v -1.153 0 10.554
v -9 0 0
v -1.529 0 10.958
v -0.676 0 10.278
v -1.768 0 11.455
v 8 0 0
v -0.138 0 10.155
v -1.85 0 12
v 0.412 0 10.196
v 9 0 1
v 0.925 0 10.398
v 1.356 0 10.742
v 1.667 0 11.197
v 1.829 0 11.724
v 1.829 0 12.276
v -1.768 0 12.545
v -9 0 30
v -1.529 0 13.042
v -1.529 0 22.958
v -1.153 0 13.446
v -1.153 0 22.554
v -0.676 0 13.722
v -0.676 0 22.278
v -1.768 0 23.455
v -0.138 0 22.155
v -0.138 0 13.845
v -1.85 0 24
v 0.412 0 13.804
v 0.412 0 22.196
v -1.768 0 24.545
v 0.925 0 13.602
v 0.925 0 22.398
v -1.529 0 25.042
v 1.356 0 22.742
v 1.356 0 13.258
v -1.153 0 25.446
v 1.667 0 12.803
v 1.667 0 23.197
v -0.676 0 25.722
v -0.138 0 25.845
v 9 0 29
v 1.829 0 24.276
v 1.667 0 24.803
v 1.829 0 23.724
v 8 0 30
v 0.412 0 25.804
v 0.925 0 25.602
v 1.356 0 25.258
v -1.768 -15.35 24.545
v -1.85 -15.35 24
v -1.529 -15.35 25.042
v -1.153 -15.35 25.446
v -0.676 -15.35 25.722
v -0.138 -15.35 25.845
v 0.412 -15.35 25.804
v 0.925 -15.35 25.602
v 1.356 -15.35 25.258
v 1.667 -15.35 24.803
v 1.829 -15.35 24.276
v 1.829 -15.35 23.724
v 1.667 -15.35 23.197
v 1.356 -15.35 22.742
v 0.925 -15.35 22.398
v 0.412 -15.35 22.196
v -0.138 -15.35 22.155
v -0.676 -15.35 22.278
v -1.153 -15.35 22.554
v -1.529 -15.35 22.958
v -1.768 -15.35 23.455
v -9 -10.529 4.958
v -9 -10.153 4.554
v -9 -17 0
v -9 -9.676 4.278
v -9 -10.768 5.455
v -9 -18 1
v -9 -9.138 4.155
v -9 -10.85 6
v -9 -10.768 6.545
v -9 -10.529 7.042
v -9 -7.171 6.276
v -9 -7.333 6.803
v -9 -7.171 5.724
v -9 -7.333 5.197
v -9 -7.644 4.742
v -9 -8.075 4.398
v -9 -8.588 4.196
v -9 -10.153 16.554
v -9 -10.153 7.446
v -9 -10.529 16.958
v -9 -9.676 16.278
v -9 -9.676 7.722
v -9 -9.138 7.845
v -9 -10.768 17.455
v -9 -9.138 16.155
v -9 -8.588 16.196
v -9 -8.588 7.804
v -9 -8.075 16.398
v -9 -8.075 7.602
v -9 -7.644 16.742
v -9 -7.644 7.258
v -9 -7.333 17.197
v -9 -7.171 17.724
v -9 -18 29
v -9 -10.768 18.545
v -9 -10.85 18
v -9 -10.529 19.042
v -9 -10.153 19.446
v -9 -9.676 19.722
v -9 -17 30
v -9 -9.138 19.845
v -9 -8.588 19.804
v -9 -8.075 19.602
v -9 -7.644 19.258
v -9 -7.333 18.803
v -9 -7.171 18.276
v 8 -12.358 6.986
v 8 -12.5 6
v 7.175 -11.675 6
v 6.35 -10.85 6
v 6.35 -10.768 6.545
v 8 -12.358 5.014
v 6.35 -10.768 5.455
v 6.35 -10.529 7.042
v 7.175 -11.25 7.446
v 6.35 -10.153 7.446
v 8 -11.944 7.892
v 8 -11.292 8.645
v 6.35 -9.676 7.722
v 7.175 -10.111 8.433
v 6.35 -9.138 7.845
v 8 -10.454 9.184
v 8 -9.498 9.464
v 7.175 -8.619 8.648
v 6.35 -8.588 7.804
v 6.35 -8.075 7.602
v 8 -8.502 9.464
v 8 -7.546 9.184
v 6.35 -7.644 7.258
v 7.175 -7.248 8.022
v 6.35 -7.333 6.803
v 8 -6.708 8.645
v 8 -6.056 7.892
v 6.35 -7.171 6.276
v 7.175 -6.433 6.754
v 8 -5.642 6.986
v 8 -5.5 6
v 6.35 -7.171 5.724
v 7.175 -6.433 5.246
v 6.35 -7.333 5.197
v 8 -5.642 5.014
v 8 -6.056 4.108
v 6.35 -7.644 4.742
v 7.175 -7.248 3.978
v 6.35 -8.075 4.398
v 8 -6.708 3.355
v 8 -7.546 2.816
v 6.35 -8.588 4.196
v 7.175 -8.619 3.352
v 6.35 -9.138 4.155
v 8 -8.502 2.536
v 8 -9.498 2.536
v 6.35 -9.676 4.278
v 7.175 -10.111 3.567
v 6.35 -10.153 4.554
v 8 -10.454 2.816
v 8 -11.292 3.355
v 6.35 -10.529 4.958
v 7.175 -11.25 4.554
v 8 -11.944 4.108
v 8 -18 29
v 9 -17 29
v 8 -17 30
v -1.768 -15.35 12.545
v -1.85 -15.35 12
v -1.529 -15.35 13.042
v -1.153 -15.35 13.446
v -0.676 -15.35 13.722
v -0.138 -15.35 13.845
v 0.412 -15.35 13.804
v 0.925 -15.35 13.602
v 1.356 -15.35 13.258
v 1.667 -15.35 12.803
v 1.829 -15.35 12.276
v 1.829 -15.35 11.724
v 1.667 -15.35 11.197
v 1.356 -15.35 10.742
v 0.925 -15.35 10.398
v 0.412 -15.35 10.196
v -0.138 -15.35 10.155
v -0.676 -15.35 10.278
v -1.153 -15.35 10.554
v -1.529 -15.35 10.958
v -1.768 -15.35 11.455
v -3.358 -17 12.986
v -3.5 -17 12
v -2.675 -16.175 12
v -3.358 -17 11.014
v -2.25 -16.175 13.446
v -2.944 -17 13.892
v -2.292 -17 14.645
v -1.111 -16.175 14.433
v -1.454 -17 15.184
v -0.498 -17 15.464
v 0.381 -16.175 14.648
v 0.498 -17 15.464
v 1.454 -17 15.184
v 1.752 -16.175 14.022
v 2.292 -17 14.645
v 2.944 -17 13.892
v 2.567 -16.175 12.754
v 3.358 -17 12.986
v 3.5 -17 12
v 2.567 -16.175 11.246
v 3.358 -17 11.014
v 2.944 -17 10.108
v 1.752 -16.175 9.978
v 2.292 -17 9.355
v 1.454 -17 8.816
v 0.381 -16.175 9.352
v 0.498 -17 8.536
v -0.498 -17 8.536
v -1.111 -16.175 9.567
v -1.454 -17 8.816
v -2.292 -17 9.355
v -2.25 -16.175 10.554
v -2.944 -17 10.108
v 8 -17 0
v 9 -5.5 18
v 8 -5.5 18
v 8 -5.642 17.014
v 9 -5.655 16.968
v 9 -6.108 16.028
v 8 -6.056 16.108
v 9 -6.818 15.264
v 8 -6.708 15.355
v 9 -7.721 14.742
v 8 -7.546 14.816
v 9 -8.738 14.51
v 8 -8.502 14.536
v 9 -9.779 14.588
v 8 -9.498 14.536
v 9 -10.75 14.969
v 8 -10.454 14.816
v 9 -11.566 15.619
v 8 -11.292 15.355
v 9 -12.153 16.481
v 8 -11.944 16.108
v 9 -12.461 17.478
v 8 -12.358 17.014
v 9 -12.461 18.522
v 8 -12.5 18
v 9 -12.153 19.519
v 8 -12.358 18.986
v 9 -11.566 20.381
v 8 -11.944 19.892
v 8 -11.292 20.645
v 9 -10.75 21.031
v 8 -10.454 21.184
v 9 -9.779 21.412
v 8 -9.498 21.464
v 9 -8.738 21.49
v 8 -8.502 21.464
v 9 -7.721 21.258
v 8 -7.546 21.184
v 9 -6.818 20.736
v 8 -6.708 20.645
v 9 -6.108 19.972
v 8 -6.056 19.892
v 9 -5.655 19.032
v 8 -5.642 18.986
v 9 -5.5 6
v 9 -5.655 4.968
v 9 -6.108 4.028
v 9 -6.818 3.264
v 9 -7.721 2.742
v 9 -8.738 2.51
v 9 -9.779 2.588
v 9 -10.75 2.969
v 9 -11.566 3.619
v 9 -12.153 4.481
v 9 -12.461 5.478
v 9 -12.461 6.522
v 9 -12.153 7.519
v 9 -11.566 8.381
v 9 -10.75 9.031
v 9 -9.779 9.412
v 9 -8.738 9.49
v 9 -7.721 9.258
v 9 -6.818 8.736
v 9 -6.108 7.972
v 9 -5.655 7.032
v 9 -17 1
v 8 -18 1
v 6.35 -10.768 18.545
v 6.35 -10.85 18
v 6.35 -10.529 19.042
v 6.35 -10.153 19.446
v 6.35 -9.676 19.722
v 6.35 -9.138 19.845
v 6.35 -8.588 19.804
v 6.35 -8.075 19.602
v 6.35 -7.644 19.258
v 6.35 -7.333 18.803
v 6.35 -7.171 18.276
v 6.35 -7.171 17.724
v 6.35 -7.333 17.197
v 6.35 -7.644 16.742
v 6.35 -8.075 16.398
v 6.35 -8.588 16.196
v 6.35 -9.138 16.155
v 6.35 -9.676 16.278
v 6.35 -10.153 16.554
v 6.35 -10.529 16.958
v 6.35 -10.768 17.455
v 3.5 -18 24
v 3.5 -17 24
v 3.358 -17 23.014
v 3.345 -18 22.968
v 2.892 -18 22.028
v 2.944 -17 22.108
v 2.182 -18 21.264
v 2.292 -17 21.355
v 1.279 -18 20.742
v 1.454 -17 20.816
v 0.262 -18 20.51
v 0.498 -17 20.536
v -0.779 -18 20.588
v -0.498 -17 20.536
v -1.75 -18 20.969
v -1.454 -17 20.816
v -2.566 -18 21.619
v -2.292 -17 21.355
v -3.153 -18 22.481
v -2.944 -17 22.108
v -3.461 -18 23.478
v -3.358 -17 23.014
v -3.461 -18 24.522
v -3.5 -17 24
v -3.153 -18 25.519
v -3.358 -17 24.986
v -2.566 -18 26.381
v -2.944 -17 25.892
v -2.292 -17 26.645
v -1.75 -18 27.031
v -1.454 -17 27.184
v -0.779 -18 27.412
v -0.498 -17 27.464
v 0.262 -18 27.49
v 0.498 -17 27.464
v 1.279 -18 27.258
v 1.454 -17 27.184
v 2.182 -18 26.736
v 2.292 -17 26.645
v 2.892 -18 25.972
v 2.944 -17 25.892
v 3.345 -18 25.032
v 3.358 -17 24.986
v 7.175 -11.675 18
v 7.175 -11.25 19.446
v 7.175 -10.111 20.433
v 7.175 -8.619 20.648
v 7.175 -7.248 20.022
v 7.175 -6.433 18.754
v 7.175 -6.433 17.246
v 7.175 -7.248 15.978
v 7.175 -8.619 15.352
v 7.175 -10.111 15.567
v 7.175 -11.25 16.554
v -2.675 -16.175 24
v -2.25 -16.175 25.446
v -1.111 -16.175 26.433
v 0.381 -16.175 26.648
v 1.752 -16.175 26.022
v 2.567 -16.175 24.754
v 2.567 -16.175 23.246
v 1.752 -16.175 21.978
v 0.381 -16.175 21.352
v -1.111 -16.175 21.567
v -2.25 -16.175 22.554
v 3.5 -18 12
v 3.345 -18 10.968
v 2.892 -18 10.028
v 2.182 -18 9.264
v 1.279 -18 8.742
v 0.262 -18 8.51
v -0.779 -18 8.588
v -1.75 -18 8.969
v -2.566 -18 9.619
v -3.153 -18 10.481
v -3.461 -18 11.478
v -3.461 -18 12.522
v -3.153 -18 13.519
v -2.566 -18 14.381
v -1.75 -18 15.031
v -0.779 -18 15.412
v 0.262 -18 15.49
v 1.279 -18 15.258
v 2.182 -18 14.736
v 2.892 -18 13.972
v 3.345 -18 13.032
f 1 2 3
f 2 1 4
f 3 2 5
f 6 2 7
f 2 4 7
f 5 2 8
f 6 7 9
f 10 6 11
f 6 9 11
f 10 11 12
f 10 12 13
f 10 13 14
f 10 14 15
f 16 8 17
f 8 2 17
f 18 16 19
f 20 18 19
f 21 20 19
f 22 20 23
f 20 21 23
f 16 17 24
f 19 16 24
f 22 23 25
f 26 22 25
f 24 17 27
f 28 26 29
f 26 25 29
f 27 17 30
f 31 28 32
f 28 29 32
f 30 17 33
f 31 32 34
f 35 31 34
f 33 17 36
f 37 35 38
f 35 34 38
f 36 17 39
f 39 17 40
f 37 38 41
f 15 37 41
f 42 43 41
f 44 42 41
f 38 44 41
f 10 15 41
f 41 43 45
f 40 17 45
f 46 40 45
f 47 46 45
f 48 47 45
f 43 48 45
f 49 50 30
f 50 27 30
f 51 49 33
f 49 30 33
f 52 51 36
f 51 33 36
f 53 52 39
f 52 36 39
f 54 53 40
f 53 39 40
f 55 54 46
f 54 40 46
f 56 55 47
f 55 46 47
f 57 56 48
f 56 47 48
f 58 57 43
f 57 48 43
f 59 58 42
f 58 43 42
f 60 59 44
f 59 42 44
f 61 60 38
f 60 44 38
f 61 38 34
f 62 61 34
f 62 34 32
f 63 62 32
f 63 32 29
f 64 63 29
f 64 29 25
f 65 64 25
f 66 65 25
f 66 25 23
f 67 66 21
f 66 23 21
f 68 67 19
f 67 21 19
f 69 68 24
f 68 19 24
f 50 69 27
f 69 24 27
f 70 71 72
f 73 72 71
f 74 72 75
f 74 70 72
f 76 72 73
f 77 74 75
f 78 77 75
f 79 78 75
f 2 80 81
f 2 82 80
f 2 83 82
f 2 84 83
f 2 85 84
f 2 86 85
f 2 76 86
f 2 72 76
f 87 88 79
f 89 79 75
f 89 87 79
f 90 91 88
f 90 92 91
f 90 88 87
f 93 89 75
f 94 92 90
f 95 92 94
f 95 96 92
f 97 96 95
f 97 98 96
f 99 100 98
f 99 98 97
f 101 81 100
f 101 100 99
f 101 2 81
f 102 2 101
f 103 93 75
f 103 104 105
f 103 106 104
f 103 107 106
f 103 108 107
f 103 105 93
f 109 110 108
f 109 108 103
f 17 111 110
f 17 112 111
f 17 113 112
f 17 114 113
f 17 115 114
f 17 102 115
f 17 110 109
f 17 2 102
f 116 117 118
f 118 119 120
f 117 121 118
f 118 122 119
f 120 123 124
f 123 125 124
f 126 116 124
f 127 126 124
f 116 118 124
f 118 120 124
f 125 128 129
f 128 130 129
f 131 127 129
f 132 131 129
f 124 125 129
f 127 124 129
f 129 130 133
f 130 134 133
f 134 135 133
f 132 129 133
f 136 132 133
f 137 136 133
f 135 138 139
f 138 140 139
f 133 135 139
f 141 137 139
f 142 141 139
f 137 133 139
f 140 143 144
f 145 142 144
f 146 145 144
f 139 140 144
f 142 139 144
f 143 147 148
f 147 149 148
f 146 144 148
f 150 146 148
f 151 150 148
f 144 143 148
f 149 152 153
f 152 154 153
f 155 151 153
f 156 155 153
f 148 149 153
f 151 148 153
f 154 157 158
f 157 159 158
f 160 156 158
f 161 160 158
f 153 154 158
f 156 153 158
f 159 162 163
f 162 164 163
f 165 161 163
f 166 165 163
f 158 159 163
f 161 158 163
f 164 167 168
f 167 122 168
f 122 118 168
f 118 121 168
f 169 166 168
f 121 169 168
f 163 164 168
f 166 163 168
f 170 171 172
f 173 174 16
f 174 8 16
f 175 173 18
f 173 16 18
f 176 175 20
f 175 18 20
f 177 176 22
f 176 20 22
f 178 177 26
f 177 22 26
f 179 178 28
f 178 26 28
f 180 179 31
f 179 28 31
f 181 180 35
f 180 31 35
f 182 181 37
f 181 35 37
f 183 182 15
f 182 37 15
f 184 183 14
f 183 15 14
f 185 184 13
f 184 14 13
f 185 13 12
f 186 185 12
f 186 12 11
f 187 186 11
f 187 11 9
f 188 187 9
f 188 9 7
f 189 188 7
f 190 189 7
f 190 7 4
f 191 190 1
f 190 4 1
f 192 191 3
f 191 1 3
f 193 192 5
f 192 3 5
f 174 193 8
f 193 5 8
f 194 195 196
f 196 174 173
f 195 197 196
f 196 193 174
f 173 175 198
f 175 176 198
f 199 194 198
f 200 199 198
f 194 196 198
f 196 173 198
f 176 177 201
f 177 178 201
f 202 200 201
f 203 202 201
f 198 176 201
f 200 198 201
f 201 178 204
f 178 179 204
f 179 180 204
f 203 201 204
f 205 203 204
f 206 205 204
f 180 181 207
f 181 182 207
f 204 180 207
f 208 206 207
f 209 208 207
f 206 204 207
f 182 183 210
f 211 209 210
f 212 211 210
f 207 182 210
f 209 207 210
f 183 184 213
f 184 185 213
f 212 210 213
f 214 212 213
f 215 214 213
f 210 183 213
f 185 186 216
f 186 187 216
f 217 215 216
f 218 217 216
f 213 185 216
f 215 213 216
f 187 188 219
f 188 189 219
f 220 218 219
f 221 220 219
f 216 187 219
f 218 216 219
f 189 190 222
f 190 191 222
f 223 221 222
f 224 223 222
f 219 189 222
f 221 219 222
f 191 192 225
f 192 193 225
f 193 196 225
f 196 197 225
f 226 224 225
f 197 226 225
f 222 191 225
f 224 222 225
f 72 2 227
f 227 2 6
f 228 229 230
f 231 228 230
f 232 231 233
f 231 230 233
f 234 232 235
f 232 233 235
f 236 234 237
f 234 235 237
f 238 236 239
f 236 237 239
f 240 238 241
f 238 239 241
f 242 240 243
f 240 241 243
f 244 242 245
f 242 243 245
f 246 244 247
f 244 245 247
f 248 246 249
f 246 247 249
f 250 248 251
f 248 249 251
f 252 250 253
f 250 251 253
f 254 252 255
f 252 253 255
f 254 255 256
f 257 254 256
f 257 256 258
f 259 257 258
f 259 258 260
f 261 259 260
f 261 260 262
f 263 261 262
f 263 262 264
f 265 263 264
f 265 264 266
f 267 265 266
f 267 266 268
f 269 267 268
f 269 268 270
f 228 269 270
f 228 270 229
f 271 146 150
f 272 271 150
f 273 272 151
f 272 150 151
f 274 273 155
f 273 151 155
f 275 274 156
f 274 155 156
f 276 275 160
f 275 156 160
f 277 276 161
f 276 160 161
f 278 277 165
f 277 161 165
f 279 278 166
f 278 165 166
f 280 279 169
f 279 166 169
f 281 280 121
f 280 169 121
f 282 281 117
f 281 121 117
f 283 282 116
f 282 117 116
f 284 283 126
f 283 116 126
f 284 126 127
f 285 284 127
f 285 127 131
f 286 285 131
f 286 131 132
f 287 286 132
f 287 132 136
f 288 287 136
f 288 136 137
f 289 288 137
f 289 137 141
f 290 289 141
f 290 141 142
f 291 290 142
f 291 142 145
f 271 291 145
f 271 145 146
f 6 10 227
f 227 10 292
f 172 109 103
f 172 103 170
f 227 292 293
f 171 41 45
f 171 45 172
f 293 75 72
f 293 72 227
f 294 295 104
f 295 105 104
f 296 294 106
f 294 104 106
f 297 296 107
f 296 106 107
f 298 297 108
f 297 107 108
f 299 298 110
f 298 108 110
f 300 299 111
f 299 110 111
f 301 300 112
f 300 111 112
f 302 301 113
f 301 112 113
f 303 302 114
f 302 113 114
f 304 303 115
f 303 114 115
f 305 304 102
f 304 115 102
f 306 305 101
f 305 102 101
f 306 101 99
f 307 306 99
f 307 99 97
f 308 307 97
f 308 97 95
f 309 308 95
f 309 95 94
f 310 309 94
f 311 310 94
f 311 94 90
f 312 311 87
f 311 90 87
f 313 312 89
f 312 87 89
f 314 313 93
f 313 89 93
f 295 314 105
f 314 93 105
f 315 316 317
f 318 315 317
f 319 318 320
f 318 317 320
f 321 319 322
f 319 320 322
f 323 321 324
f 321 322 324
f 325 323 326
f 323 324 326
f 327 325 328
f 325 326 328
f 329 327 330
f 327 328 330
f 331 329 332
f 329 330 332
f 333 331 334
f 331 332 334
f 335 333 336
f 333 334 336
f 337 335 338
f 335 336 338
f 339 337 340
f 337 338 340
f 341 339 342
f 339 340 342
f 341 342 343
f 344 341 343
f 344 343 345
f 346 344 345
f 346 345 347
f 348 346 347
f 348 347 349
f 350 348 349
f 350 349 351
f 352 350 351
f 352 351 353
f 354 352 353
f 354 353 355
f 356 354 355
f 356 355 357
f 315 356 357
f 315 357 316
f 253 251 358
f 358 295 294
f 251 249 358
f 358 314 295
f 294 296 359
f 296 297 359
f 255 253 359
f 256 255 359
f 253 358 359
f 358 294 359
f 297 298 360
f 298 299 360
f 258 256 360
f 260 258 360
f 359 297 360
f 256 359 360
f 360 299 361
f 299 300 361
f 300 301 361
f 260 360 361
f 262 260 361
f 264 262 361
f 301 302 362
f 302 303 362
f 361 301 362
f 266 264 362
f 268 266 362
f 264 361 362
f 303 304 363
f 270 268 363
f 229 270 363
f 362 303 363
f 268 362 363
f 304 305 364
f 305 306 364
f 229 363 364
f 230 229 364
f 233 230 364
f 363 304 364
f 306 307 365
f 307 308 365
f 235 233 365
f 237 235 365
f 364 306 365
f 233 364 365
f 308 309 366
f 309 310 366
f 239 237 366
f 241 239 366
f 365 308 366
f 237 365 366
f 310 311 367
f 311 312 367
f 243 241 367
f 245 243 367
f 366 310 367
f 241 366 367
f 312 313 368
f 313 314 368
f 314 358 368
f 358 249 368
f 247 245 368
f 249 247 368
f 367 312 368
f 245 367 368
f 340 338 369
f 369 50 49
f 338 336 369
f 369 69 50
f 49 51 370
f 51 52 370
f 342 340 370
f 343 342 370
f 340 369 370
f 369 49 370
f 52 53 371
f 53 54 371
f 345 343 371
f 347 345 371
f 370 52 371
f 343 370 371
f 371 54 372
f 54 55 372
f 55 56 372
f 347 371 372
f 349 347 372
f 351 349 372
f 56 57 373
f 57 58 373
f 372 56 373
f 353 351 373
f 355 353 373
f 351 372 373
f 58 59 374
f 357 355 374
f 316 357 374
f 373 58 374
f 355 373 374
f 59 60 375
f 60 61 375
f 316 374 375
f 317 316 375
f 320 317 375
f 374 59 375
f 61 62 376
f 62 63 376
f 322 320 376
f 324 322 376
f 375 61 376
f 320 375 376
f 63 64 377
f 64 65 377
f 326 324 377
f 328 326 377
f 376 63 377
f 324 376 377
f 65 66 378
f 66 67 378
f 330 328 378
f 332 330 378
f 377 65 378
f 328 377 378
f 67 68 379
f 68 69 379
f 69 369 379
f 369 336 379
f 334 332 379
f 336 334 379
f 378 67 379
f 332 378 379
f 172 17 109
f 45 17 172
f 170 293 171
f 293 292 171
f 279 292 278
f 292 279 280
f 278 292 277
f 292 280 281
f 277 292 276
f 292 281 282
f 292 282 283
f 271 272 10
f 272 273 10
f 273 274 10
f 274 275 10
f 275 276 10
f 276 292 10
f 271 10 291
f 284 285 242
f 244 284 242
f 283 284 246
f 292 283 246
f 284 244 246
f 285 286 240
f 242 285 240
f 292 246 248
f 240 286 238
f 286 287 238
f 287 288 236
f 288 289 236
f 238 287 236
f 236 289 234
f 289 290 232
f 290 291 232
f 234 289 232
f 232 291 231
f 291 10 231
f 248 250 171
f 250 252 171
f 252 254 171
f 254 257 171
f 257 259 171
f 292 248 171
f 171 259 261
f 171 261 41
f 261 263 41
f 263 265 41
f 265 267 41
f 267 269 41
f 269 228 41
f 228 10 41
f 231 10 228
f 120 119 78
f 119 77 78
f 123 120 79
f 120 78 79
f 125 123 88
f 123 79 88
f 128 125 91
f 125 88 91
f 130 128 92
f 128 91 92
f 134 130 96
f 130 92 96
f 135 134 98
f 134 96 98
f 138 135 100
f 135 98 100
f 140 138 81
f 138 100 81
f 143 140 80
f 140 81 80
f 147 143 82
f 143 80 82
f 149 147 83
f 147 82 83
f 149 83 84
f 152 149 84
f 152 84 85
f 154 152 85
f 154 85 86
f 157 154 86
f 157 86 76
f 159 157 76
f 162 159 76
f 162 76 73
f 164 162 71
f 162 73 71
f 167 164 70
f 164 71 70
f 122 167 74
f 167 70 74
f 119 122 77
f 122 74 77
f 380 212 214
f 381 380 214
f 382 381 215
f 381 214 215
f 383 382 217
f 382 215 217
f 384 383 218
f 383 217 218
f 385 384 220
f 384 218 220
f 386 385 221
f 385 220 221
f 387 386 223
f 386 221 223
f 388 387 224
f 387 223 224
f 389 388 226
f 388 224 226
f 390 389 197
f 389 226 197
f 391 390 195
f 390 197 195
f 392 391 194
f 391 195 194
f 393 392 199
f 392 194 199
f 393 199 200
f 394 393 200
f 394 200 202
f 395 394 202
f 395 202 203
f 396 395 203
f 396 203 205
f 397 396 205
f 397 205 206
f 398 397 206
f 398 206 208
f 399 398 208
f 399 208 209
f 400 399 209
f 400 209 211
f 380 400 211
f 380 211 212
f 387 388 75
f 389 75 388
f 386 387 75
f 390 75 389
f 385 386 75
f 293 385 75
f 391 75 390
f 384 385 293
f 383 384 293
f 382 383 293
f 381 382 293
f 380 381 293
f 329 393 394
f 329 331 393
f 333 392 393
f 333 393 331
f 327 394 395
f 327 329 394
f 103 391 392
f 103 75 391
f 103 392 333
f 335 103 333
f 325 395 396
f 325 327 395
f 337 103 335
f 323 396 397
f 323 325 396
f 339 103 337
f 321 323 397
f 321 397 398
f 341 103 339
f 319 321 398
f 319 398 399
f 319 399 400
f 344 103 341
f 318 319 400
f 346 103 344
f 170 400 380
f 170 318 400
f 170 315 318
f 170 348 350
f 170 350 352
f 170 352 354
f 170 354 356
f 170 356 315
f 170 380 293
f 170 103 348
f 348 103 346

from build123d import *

# Parameters (mm, degrees)
F0_W           = 18
F0_H           = 30
F1_DEPTH       = 18
F4_D           = 7
F4_DEPTH       = 1.001
F5_D           = 3.7
F5_CSINK_D     = 7
F5_CSINK_ANGLE = 90
F8_D           = 7
F8_DEPTH       = 1.001
F9_D           = 3.7
F9_CSINK_D     = 7
F9_CSINK_ANGLE = 90
F10_SIZE       = 1


with BuildPart() as f1:
    # F0 (on Front) → F1 (new body)
    with BuildSketch(Plane.XZ):
        with Locations((0, 15)):
            Rectangle(F0_W, F0_H)
    extrude(amount=F1_DEPTH)

    # F4 (through all, one way)
    with BuildSketch(Plane(origin=(0, -17, 0), x_dir=(1, 0, 0), z_dir=(0, 1, 0))):
        with Locations((0, -24), (0, -12)):
            Circle(F4_D / 2)
    extrude(amount=-F4_DEPTH, mode=Mode.SUBTRACT)

    # F5 (through all)
    with Locations(Plane.XZ.offset(17)):
        with Locations((0, 24), (0, 12)):
            CounterSinkHole(F5_D / 2, F5_CSINK_D / 2, counter_sink_angle=F5_CSINK_ANGLE)

    # F8 (through all, one way)
    with BuildSketch(Plane(origin=(8, 0, 0), x_dir=(0, 1, 0), z_dir=(-1, 0, 0))):
        with Locations((-9, -18), (-9, -6)):
            Circle(F8_D / 2)
    extrude(amount=-F8_DEPTH, mode=Mode.SUBTRACT)

    # F9 (through all)
    with Locations(Plane.YZ.offset(8)):
        with Locations((-9, 18), (-9, 6)):
            CounterSinkHole(F9_D / 2, F9_CSINK_D / 2, counter_sink_angle=F9_CSINK_ANGLE)

    # F10
    f10_edges = [f1.edges().sort_by_distance(p)[0] for p in [
        (9, -18, 15),
        (9, -9, 30),
        (0, -18, 30),
        (9, -9, 0),
        (0, -18, 0),
    ]]
    chamfer(f10_edges, length=F10_SIZE)


solid = f1.part
